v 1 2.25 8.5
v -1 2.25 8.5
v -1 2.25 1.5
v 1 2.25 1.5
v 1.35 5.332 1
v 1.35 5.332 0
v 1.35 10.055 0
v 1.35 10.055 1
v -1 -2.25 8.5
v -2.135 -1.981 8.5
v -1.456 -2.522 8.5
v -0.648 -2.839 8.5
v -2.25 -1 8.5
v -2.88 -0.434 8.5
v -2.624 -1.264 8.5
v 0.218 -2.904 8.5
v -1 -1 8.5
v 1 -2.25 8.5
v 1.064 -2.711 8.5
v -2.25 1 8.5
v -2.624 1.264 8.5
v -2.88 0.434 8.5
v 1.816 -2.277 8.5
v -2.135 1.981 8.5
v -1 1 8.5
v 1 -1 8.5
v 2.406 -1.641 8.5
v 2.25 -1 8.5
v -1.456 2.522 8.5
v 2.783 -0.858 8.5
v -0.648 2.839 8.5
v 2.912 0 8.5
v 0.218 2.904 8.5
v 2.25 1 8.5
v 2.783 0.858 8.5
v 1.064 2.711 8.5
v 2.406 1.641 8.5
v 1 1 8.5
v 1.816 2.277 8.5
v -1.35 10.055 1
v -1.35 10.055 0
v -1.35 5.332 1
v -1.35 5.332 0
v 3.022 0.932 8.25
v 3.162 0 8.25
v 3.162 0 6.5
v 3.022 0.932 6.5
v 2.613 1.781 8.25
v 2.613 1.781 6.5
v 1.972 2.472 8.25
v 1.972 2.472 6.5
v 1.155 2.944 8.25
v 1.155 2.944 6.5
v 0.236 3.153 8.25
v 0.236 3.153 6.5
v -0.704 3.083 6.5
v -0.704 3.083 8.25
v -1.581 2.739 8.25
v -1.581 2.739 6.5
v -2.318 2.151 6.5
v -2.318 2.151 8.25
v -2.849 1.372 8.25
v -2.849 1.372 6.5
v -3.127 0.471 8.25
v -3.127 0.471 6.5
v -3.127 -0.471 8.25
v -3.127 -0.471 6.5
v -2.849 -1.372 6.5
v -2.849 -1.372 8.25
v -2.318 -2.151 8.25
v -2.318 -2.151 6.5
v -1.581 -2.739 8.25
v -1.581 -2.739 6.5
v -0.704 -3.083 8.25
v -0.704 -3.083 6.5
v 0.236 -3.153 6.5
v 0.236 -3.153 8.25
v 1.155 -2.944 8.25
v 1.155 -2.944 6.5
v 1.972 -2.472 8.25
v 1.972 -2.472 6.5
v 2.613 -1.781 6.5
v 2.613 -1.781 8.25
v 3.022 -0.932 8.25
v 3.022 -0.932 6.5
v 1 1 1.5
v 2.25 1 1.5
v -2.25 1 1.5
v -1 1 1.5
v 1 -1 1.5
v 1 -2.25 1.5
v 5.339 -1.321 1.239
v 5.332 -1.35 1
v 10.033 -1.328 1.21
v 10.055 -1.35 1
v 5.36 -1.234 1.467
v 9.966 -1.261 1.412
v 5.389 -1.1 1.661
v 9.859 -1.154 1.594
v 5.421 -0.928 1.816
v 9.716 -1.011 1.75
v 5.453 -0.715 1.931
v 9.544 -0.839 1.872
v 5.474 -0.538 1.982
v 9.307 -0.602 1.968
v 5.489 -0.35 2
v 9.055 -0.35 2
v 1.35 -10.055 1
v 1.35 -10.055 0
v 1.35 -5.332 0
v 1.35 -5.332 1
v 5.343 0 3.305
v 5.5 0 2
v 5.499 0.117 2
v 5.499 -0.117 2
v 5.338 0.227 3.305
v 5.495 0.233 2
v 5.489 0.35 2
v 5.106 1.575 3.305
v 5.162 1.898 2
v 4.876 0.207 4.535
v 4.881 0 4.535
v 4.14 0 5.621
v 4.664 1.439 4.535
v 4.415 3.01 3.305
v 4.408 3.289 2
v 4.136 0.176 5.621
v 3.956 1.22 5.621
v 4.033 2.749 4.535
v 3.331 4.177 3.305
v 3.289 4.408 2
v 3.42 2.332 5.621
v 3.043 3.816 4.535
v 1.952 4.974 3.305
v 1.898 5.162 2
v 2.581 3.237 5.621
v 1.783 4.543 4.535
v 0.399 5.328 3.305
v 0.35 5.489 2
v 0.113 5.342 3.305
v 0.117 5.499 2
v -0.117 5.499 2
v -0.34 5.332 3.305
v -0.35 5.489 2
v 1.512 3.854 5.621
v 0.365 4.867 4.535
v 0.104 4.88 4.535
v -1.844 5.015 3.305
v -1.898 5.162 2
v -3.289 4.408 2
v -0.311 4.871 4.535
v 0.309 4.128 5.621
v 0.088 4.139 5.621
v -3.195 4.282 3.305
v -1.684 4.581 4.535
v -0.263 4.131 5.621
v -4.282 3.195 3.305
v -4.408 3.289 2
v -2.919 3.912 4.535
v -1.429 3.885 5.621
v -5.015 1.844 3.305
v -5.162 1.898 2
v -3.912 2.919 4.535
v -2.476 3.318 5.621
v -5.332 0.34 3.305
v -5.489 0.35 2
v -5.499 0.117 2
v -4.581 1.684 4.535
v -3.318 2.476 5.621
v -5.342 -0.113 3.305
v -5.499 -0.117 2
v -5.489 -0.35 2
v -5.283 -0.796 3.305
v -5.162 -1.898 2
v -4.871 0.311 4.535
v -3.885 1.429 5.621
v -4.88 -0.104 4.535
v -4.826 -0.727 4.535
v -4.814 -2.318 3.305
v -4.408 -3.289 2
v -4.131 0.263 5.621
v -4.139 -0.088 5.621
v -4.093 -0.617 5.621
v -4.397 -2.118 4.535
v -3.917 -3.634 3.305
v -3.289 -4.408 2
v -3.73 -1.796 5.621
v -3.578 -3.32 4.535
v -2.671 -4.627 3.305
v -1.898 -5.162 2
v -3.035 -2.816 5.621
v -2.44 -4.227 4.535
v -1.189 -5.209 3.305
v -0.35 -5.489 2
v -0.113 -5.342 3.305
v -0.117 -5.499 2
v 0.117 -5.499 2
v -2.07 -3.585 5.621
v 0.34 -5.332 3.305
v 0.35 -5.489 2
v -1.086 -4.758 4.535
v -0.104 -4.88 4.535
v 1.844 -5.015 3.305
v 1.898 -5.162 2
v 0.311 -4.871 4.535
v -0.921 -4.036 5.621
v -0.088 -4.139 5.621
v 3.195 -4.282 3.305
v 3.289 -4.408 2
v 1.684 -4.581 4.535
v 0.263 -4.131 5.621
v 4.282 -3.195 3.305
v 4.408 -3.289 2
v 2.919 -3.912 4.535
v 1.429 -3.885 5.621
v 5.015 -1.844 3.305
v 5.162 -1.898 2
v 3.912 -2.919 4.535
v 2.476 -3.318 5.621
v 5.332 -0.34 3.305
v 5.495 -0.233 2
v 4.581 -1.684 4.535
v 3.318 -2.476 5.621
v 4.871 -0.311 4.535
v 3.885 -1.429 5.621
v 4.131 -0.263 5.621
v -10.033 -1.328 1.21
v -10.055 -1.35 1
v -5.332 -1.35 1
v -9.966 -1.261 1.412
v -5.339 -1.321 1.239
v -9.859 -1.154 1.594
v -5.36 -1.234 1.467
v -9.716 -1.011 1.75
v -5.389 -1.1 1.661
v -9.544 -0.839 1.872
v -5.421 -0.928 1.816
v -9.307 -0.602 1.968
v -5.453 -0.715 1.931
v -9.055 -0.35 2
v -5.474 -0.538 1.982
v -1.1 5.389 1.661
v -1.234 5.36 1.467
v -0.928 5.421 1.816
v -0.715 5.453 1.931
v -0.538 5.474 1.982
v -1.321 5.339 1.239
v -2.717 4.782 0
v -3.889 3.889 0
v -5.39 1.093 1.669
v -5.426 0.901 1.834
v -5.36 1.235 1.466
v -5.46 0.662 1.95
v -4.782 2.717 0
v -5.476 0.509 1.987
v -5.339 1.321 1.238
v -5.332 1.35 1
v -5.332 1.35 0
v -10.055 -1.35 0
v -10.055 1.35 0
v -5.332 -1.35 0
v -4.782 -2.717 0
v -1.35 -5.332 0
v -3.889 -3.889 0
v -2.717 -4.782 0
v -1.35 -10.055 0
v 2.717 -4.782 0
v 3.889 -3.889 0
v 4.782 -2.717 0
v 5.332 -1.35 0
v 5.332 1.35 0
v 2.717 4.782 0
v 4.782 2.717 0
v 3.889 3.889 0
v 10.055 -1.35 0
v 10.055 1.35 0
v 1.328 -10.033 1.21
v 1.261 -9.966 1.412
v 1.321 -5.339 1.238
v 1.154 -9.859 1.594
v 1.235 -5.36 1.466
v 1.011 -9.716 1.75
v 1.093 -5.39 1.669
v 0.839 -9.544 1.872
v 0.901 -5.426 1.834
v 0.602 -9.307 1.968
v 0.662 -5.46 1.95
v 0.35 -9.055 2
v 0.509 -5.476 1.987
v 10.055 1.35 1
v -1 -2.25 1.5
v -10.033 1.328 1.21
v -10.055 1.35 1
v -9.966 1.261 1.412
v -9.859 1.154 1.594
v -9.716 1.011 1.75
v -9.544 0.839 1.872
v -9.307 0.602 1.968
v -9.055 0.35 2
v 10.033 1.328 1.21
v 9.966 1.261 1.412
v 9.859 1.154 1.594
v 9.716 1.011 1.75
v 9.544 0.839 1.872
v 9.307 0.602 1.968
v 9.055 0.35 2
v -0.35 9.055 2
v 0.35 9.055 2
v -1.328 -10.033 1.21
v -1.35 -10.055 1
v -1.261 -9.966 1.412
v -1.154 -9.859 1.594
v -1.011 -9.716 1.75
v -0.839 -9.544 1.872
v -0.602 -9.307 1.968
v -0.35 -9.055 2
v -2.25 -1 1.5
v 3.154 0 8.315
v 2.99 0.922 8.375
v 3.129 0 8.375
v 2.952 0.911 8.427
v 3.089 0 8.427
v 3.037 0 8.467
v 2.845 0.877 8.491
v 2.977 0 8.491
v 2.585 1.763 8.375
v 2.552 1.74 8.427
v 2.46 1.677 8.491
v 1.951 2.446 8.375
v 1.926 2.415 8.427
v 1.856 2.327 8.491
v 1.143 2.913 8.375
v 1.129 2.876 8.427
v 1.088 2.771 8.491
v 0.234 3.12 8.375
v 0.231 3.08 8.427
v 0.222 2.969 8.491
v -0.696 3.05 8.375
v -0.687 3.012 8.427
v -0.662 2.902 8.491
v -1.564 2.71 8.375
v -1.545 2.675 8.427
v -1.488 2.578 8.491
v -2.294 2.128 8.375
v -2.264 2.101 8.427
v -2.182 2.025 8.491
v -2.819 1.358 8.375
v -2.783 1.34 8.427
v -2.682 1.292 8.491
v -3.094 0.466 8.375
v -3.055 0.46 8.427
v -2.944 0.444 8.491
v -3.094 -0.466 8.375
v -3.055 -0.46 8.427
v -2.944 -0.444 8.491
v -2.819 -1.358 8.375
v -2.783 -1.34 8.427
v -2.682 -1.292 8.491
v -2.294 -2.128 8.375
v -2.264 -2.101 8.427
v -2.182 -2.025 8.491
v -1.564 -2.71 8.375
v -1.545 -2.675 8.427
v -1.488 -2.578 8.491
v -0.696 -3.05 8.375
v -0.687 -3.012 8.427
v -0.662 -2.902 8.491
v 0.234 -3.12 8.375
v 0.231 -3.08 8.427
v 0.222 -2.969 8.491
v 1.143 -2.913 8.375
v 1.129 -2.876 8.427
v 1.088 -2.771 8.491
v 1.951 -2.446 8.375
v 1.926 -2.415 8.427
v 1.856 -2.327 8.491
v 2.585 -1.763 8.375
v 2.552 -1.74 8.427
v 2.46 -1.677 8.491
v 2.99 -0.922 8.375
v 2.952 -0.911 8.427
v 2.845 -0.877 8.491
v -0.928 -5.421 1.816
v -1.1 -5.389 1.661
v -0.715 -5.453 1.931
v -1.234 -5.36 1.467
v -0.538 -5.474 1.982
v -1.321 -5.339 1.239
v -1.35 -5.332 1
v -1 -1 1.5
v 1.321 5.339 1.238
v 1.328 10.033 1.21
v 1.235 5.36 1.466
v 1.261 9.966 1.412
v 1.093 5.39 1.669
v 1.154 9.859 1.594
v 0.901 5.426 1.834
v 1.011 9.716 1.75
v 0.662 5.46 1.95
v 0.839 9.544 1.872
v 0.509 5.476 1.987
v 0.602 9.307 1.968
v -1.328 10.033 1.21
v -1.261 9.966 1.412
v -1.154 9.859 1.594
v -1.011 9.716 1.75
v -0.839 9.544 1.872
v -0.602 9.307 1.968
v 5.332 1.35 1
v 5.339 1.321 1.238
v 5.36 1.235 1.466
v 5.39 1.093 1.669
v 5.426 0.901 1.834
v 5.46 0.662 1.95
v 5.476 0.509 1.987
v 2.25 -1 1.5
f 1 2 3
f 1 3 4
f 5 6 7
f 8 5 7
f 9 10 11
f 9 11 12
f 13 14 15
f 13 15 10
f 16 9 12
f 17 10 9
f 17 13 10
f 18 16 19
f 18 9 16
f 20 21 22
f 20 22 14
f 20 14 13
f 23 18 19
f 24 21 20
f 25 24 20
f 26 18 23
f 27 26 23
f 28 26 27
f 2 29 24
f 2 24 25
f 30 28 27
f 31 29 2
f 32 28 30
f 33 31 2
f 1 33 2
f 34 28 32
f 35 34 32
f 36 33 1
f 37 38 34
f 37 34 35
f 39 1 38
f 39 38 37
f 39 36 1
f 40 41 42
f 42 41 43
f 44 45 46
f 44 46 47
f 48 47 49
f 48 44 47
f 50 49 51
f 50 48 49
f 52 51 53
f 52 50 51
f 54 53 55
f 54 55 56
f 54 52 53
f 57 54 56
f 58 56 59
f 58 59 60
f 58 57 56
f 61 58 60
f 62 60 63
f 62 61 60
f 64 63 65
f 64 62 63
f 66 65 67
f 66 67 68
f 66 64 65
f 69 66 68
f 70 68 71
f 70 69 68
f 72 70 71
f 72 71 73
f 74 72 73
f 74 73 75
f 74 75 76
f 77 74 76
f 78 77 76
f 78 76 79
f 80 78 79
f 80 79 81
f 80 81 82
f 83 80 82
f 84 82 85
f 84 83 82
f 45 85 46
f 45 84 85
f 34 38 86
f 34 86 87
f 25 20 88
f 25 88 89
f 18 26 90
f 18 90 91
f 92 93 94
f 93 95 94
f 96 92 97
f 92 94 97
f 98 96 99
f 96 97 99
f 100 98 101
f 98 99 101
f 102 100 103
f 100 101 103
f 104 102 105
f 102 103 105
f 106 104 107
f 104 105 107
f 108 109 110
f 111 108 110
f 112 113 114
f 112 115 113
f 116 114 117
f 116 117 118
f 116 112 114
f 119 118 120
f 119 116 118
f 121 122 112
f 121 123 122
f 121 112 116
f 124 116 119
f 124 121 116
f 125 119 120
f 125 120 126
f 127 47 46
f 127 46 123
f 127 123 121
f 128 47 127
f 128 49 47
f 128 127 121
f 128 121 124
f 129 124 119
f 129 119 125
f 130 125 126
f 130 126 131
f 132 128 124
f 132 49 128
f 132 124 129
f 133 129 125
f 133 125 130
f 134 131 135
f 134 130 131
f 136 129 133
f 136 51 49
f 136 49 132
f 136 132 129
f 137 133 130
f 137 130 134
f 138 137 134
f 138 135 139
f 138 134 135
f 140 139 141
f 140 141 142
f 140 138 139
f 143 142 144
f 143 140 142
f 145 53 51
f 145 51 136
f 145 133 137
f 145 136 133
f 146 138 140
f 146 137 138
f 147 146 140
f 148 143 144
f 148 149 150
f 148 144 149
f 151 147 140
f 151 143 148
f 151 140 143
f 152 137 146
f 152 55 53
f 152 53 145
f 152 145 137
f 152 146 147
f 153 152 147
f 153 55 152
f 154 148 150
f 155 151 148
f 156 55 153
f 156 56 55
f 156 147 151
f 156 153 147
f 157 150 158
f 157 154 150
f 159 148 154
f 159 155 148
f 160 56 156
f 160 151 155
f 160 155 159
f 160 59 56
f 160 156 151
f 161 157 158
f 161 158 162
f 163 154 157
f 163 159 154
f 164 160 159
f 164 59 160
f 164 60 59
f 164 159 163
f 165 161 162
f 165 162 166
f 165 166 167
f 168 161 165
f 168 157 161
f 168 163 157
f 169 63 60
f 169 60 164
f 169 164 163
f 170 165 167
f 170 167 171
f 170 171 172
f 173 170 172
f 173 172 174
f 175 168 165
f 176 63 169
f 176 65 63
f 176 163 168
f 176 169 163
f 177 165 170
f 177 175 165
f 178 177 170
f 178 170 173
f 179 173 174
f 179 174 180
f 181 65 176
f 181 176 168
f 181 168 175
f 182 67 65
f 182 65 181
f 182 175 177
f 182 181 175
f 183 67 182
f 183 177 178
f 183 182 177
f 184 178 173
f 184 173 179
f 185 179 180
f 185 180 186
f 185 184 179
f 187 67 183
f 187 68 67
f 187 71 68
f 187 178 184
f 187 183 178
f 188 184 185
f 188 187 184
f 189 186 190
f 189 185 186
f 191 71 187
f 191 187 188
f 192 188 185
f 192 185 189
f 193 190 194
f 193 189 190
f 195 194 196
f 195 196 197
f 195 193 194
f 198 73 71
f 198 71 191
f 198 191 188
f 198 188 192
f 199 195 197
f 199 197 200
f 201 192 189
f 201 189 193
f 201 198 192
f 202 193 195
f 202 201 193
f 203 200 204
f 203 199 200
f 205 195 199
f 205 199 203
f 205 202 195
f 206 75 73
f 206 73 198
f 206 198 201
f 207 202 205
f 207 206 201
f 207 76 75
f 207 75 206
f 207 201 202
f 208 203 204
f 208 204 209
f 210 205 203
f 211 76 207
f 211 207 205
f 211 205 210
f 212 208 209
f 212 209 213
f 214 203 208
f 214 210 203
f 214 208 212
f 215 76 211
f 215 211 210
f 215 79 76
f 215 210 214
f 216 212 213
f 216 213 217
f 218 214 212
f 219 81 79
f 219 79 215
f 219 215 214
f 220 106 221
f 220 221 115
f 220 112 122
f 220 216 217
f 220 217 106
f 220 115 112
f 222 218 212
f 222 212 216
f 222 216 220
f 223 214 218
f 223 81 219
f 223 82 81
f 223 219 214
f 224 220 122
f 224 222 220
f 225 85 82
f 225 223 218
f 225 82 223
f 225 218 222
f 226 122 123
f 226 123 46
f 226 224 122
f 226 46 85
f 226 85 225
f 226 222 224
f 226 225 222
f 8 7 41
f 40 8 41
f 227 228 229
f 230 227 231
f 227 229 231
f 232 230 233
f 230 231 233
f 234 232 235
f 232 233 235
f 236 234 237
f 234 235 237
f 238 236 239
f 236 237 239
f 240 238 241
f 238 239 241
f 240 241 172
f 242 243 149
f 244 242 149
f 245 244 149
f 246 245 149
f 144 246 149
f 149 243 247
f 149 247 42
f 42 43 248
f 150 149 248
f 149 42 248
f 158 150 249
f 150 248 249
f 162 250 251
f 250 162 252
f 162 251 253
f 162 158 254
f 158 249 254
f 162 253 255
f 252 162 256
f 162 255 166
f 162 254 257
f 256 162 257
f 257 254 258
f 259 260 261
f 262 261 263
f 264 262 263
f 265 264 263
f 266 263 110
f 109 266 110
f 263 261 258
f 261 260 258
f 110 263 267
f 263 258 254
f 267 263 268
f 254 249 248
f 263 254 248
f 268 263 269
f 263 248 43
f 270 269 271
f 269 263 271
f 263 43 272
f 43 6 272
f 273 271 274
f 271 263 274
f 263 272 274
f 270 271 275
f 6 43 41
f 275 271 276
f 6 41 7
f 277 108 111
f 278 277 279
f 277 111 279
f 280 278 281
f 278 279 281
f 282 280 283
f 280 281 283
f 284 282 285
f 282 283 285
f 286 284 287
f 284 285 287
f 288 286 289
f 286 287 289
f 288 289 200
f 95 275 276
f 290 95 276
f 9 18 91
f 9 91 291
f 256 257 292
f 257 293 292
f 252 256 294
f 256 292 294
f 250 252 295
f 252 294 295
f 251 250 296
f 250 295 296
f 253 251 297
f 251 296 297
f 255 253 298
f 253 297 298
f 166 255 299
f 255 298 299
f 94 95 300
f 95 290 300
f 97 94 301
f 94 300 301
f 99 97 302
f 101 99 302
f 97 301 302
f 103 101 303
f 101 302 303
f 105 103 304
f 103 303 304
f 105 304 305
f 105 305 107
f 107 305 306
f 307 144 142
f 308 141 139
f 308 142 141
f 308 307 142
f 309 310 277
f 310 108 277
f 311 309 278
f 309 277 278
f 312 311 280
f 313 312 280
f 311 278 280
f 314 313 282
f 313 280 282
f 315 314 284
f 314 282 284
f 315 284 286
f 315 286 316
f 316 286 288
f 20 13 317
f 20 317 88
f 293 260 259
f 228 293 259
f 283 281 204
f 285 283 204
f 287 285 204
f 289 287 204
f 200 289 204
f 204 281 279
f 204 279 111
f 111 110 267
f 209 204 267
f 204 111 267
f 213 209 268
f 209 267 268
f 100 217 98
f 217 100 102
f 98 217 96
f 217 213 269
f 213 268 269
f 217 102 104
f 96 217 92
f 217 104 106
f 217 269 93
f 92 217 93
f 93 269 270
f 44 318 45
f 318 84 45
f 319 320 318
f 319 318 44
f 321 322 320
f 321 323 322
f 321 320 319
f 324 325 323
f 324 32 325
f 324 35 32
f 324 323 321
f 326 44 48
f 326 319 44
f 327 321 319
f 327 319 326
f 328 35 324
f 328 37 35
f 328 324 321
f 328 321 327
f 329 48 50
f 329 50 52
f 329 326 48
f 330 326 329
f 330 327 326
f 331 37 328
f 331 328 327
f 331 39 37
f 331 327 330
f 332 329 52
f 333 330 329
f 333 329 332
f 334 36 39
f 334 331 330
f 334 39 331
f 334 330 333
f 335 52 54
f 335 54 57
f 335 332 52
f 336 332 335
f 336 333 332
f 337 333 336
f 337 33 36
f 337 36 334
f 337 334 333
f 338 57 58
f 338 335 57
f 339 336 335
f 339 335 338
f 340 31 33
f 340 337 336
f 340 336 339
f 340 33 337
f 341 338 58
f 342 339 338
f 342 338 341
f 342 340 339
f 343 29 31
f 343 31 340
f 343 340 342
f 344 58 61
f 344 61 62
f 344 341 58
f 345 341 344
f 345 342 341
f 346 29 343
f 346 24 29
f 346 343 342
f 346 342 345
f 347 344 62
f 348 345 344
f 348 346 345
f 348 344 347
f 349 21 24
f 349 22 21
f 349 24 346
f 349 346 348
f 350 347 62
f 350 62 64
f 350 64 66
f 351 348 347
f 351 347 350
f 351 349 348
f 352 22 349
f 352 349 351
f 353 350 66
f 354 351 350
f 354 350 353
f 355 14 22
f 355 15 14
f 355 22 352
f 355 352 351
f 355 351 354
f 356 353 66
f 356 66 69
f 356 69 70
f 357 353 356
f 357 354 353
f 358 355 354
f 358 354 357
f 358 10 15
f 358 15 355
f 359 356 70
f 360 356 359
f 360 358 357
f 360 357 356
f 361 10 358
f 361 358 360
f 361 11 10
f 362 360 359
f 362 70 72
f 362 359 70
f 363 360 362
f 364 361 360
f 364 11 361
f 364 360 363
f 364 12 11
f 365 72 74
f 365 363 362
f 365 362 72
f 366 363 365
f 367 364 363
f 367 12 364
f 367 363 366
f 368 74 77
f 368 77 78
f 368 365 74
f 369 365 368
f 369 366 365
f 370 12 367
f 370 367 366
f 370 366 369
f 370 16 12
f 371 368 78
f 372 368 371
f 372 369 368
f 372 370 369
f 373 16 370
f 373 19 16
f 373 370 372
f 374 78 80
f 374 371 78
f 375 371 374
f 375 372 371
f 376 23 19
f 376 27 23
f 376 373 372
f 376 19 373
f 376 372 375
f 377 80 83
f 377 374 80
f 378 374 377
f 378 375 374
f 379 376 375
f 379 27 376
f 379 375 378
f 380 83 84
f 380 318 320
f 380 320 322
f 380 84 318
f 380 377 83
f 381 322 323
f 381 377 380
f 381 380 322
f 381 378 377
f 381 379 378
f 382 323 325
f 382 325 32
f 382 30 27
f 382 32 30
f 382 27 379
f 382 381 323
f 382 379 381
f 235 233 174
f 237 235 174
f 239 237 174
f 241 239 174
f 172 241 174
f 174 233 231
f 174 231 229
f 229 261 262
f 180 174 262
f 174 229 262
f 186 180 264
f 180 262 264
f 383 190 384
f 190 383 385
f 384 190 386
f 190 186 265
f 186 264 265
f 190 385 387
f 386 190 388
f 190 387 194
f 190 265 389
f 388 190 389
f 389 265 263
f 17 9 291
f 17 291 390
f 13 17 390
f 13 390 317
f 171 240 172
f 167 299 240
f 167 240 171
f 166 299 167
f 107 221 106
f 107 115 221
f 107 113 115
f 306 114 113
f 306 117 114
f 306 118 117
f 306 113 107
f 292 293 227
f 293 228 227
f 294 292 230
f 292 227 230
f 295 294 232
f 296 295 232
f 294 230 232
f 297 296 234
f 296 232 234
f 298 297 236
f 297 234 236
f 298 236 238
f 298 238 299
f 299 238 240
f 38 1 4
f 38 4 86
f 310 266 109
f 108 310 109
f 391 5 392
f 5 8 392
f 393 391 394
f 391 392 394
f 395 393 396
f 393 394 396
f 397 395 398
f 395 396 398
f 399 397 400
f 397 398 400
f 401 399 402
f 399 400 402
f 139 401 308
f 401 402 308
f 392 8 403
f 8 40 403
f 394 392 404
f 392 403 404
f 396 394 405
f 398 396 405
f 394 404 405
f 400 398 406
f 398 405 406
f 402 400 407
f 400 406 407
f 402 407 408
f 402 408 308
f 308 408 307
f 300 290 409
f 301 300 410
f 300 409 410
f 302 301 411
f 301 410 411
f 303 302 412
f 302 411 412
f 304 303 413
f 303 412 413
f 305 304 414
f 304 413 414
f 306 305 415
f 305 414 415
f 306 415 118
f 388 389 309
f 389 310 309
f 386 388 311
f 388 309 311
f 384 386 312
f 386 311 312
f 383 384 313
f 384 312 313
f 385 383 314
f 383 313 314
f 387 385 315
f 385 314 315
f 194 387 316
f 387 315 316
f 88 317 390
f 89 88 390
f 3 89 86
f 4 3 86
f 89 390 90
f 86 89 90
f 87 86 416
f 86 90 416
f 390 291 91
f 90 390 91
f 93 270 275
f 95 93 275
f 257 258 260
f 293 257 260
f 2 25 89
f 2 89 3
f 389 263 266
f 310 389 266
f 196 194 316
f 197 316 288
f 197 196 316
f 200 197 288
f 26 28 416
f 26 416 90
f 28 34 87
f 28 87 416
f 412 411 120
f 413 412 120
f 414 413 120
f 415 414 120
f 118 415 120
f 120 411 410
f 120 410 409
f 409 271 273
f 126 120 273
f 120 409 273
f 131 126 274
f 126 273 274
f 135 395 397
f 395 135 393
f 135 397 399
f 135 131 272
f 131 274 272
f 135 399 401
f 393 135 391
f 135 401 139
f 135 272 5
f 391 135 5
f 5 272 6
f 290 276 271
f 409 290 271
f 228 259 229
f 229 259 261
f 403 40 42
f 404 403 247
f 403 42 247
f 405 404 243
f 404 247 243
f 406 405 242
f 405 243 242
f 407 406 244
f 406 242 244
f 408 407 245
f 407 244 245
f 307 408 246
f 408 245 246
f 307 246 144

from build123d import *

# Parameters (mm, degrees)
PAD_DEPTH    = 2
POCKET_DEPTH = 7
FILLET004_R  = 1
FILLET005_R  = 0.25


with BuildPart() as arms:
    # Sketch → Pad (new body)
    with BuildSketch(Plane.XY):
        Polygon((-10.055, 1.35), (-10.055, -1.35), (-1.35, -1.35), (-1.35, -10.055), (1.35, -10.055), (1.35, -1.35), (10.055, -1.35), (10.055, 1.35), (1.35, 1.35), (1.35, 10.055), (-1.35, 10.055), (-1.35, 1.35), align=None)
    extrude(amount=PAD_DEPTH)


with BuildPart() as rotation_center_ball:
    # Sketch001 → Revolution (revolve)
    with BuildSketch(Plane.XZ):
        with BuildLine():
            Line((5.5, 2), (5.5, 0))
            Line((5.5, 0), (0, 0))
            Line((0, 8.5), (0, 0))
            Line((3.162278, 8.5), (0, 8.5))
            Line((3.162278, 6.5), (3.162278, 8.5))
            ThreePointArc((5.5, 2), (4.880703, 4.535495), (3.162278, 6.5))
        make_face()
    revolve(axis=Axis((0, 0, 0), (0, 0, 1)))

    # Boolean: union Arms
    add(arms.part)

    # Sketch002 (on ShapeBinder) → Pocket (cut)
    with BuildSketch(Plane(origin=(0, 0, 8.5), x_dir=(-1, 0, 0), z_dir=(0, 0, 1))):
        Polygon((-2.25, 1), (-1, 1), (-1, 2.25), (1, 2.25), (1, 1), (2.25, 1), (2.25, -1), (1, -1), (1, -2.25), (-1, -2.25), (-1, -1), (-2.25, -1), align=None)
    extrude(amount=-POCKET_DEPTH, mode=Mode.SUBTRACT)

    # Fillet004
    fillet004_edges = [rotation_center_ball.edges().sort_by_distance(p)[0] for p in [
        (0, 10.055, 2),
        (10.055, 0, 2),
        (-10.055, 0, 2),
        (0, -10.055, 2),
        (-7.693372, -1.35, 2),
        (-7.693372, 1.35, 2),
        (-1.35, -7.693372, 2),
        (1.35, -7.693372, 2),
        (7.693372, -1.35, 2),
        (7.693372, 1.35, 2),
        (-1.35, 7.693372, 2),
        (1.35, 7.693372, 2),
    ]]
    fillet(fillet004_edges, radius=FILLET004_R)

    # Fillet005
    fillet005_edges = [rotation_center_ball.edges().sort_by_distance(p)[0] for p in [
        (-3.162278, 0, 8.5),
    ]]
    fillet(fillet005_edges, radius=FILLET005_R)


solid = rotation_center_ball.part
